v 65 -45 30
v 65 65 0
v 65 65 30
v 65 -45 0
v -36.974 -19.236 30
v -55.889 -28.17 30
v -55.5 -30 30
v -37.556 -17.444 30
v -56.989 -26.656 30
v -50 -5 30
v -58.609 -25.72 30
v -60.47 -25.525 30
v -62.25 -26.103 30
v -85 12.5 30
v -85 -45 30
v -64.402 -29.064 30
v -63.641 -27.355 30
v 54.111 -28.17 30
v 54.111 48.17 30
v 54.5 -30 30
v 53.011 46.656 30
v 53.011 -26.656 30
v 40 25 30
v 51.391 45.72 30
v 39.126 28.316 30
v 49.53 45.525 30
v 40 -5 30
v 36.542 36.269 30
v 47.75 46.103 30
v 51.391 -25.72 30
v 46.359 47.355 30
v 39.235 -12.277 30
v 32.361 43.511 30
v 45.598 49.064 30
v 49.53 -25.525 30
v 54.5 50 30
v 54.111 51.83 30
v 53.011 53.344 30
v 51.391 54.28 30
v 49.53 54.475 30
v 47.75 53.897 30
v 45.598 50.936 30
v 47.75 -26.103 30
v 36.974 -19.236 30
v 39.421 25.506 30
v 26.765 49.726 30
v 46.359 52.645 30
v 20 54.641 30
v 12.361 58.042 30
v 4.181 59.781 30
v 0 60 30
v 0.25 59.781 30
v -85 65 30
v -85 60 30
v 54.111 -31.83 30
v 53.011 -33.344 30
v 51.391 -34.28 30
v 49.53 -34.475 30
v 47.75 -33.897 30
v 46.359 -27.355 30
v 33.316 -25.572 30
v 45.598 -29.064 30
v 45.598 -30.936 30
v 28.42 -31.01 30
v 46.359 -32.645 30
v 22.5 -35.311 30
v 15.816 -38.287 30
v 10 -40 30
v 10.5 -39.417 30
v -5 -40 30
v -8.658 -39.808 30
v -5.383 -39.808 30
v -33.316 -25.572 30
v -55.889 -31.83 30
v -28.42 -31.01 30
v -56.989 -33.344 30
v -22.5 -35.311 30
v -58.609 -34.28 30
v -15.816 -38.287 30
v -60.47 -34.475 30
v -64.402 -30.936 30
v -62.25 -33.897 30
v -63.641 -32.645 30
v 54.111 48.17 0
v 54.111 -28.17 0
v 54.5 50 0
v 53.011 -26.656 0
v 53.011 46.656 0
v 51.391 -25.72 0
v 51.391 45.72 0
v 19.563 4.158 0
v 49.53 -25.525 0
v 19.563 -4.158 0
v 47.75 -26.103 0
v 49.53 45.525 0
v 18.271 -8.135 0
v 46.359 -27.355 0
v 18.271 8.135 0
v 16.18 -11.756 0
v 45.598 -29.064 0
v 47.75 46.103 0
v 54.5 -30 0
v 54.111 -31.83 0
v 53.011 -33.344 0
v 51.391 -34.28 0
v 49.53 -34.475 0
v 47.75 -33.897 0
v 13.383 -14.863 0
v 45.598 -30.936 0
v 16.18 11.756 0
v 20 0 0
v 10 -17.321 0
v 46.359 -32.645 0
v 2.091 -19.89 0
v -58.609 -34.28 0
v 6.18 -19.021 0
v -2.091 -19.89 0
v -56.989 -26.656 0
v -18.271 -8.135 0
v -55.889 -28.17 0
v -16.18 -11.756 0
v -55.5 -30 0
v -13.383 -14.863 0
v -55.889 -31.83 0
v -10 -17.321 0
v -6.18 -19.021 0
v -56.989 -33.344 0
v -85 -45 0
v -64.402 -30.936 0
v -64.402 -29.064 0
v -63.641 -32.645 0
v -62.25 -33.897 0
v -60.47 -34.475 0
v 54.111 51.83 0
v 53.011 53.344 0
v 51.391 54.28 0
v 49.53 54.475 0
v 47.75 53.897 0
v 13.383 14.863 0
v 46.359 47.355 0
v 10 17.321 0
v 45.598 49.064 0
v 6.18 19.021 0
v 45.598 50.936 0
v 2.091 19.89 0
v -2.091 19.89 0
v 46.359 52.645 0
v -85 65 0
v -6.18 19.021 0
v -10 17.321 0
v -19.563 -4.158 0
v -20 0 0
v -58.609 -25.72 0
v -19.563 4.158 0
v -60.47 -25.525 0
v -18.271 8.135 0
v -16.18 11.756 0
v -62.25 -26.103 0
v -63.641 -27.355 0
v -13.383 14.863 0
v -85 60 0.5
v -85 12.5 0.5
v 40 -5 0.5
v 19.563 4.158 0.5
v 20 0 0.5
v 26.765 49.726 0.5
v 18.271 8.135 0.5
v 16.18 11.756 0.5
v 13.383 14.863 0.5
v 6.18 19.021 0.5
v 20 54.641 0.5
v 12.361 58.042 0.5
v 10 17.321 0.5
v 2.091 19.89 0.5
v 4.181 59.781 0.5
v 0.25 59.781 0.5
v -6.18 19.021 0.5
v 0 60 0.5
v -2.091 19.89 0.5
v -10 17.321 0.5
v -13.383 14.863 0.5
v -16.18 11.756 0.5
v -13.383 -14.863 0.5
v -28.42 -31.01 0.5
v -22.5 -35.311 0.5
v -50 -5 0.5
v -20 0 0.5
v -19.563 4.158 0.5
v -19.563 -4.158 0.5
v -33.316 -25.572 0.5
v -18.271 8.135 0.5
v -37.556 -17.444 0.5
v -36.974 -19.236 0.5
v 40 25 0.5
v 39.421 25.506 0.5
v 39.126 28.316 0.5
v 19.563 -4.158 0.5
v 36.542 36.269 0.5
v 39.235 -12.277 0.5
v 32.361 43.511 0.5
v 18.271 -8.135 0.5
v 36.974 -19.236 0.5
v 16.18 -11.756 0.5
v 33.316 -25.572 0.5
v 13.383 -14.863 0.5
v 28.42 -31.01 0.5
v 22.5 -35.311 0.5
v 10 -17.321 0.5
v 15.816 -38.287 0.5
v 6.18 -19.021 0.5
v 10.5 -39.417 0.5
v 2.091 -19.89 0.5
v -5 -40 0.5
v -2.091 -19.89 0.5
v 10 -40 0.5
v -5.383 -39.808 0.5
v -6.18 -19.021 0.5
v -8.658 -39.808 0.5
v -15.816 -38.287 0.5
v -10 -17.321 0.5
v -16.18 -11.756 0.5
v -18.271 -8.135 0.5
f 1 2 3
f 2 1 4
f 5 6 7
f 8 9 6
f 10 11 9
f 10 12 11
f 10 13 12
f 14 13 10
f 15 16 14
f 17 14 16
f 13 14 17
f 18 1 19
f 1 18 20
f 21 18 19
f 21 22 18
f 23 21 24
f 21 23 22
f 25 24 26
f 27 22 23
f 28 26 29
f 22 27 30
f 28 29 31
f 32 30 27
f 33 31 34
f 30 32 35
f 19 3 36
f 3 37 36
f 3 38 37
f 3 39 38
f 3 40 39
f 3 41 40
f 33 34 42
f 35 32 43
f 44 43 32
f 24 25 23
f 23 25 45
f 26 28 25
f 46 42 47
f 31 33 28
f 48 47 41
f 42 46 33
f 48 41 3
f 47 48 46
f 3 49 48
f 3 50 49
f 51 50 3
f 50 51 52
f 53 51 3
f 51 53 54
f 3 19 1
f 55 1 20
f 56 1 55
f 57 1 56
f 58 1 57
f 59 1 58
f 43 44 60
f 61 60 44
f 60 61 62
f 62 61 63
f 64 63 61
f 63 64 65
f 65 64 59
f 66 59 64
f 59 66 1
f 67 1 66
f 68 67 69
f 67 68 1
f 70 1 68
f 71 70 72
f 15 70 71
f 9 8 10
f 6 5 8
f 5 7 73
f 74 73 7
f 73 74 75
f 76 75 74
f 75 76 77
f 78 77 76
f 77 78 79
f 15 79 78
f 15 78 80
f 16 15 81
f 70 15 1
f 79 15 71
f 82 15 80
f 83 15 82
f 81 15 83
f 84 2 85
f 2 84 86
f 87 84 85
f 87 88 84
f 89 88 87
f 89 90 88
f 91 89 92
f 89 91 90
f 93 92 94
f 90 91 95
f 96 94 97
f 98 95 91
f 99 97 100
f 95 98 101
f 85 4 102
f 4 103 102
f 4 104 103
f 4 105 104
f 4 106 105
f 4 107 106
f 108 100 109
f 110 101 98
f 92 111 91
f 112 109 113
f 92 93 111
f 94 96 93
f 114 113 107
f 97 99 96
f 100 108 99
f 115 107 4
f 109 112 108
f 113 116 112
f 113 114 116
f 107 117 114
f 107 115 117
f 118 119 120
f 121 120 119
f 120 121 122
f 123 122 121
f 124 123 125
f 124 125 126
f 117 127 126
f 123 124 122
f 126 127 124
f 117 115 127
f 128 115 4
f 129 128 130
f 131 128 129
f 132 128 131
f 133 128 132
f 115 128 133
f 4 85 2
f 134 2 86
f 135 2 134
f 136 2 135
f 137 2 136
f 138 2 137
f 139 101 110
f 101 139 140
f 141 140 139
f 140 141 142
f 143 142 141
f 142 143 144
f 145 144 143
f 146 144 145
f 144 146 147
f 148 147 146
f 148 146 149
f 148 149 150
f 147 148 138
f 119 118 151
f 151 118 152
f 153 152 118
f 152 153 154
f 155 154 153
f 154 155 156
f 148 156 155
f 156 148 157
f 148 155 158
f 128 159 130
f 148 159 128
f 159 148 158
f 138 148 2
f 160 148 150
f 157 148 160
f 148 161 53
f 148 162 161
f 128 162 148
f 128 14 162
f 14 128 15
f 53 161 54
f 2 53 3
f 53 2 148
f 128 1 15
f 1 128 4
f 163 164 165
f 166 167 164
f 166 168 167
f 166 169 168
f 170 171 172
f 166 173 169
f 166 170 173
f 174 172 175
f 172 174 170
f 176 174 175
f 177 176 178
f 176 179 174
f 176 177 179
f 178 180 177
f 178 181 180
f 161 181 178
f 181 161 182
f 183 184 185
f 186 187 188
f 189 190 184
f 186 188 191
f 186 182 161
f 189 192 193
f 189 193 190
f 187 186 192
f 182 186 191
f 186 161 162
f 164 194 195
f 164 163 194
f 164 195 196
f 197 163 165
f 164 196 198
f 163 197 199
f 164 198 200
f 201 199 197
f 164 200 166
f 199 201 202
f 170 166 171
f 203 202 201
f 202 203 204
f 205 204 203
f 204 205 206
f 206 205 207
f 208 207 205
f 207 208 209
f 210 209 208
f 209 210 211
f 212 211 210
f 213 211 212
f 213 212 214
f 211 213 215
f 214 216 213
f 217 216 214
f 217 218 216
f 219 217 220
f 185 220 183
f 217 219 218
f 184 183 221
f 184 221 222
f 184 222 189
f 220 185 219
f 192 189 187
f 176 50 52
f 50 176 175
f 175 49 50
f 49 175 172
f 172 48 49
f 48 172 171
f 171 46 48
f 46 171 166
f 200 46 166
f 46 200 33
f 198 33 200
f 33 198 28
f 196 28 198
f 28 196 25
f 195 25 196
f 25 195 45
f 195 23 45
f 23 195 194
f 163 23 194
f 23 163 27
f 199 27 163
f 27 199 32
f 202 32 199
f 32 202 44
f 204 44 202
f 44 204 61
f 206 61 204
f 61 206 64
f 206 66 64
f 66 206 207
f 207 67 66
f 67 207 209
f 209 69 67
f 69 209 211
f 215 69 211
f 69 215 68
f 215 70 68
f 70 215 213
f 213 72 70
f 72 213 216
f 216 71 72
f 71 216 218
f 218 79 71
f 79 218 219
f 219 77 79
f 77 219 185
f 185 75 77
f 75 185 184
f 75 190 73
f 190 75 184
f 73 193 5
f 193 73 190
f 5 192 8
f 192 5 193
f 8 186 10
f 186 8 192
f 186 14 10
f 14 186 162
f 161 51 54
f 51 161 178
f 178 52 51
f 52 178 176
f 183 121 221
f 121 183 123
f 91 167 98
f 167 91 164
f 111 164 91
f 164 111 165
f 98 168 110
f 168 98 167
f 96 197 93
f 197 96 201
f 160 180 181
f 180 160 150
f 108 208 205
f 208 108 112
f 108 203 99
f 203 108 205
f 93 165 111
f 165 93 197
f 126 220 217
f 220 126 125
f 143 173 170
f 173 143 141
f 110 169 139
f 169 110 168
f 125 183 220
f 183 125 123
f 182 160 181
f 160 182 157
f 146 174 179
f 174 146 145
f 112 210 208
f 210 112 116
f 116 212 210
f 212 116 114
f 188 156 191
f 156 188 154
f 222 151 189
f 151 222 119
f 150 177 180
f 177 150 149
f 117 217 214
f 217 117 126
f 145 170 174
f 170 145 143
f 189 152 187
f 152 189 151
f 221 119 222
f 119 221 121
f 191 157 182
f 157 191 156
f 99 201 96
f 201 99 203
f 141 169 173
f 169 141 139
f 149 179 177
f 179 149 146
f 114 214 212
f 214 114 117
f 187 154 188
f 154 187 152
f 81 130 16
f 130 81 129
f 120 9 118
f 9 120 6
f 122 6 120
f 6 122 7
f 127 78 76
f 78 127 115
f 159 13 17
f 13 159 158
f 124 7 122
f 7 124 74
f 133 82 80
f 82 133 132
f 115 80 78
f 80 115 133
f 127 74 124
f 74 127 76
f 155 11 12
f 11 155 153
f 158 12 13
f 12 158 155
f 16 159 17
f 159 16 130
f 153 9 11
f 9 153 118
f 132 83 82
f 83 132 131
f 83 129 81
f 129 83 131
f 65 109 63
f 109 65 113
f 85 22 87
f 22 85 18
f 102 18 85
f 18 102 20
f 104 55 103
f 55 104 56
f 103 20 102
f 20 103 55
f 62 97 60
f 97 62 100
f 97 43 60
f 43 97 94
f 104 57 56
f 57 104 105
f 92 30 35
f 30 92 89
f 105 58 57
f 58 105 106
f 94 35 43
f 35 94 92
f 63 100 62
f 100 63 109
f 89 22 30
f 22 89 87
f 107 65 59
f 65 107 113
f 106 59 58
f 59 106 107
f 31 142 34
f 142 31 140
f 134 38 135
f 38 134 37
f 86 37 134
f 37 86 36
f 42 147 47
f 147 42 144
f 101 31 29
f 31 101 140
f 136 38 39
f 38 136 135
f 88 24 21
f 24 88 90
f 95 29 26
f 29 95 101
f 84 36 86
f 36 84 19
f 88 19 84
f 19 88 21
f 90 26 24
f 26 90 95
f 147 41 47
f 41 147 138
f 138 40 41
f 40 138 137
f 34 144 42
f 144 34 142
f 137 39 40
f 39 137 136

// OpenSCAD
module mk3(){
    difference(){
        union(){
            polygon([[-90,-60],[0,-60], 
            [40,-25], [40,5],
            [10,40],[-5,40],
            [-25,30], [-50,5], [-90,-15]]);
            
            translate([0,-20])circle(r=40);
            translate([5,5])circle(r=35);
            
            
            translate([-5,5])circle(r=35);
        }
        //circle(r=15);
    }
}

module antirotation_mk3(){
    difference(){
        translate([-85,-45])cube([85+65, 110, 30]);
        translate([0,0,0.5]) mirror([0,1])linear_extrude(height = 40) mk3();
        translate([0,0,-1])cylinder(r=20, h=30);
        translate([-60,-30,-1])cylinder(r=4.5, h=50);
        translate([50,-30,-1])cylinder(r=4.5, h=50);
        translate([50,50,-1])cylinder(r=4.5, h=50);
        
        %cylinder(r=65,h=10);
    }
}

module d_7215(){
    difference(){
        union(){
            polygon([[-95,-63],[-80,-66], [-50,-72],
            [-5,-68], [7,-62],[22,-51], [34,-40], [42,-30], [46,-21], [49,-10],
            [50,0],[49,10], [46,20], [40, 30], [30, 40], [23, 45], [10,50],
            [0,52] ,[-28,50] ,[-44, 45], [-53,41], [-84,23], [-91,18]]);
         
        }
        circle(r=15);
    }
}

module test_7215(){
    difference(){
    linear_extrude(height = 40) scale(1.1) d_7215();
    linear_extrude(height = 42) d_7215();
    //translate([-190,-80])cube([100,100,100]);
}
}

module antirotation_7215(){
    difference(){
        hull(){
            translate([-75,-65])cube([75+65, 130, 30]);
            translate([-79,-65]) rotate([0,0,22])cube([70, 105, 30]);
        }
        translate([0,0,1]) mirror([0,1]) rotate([0,0,-20])linear_extrude(height = 40) d_7215();
        translate([0,0,-1])cylinder(r=20, h=40);
        translate([-100,-18,26]) mirror([0,1]) rotate([0,-90,-20])cylinder(r=25, h=100, center = true);
        %cylinder(r=65,h=10);
    }
}
//antirotation_7215();

antirotation_mk3();

            
